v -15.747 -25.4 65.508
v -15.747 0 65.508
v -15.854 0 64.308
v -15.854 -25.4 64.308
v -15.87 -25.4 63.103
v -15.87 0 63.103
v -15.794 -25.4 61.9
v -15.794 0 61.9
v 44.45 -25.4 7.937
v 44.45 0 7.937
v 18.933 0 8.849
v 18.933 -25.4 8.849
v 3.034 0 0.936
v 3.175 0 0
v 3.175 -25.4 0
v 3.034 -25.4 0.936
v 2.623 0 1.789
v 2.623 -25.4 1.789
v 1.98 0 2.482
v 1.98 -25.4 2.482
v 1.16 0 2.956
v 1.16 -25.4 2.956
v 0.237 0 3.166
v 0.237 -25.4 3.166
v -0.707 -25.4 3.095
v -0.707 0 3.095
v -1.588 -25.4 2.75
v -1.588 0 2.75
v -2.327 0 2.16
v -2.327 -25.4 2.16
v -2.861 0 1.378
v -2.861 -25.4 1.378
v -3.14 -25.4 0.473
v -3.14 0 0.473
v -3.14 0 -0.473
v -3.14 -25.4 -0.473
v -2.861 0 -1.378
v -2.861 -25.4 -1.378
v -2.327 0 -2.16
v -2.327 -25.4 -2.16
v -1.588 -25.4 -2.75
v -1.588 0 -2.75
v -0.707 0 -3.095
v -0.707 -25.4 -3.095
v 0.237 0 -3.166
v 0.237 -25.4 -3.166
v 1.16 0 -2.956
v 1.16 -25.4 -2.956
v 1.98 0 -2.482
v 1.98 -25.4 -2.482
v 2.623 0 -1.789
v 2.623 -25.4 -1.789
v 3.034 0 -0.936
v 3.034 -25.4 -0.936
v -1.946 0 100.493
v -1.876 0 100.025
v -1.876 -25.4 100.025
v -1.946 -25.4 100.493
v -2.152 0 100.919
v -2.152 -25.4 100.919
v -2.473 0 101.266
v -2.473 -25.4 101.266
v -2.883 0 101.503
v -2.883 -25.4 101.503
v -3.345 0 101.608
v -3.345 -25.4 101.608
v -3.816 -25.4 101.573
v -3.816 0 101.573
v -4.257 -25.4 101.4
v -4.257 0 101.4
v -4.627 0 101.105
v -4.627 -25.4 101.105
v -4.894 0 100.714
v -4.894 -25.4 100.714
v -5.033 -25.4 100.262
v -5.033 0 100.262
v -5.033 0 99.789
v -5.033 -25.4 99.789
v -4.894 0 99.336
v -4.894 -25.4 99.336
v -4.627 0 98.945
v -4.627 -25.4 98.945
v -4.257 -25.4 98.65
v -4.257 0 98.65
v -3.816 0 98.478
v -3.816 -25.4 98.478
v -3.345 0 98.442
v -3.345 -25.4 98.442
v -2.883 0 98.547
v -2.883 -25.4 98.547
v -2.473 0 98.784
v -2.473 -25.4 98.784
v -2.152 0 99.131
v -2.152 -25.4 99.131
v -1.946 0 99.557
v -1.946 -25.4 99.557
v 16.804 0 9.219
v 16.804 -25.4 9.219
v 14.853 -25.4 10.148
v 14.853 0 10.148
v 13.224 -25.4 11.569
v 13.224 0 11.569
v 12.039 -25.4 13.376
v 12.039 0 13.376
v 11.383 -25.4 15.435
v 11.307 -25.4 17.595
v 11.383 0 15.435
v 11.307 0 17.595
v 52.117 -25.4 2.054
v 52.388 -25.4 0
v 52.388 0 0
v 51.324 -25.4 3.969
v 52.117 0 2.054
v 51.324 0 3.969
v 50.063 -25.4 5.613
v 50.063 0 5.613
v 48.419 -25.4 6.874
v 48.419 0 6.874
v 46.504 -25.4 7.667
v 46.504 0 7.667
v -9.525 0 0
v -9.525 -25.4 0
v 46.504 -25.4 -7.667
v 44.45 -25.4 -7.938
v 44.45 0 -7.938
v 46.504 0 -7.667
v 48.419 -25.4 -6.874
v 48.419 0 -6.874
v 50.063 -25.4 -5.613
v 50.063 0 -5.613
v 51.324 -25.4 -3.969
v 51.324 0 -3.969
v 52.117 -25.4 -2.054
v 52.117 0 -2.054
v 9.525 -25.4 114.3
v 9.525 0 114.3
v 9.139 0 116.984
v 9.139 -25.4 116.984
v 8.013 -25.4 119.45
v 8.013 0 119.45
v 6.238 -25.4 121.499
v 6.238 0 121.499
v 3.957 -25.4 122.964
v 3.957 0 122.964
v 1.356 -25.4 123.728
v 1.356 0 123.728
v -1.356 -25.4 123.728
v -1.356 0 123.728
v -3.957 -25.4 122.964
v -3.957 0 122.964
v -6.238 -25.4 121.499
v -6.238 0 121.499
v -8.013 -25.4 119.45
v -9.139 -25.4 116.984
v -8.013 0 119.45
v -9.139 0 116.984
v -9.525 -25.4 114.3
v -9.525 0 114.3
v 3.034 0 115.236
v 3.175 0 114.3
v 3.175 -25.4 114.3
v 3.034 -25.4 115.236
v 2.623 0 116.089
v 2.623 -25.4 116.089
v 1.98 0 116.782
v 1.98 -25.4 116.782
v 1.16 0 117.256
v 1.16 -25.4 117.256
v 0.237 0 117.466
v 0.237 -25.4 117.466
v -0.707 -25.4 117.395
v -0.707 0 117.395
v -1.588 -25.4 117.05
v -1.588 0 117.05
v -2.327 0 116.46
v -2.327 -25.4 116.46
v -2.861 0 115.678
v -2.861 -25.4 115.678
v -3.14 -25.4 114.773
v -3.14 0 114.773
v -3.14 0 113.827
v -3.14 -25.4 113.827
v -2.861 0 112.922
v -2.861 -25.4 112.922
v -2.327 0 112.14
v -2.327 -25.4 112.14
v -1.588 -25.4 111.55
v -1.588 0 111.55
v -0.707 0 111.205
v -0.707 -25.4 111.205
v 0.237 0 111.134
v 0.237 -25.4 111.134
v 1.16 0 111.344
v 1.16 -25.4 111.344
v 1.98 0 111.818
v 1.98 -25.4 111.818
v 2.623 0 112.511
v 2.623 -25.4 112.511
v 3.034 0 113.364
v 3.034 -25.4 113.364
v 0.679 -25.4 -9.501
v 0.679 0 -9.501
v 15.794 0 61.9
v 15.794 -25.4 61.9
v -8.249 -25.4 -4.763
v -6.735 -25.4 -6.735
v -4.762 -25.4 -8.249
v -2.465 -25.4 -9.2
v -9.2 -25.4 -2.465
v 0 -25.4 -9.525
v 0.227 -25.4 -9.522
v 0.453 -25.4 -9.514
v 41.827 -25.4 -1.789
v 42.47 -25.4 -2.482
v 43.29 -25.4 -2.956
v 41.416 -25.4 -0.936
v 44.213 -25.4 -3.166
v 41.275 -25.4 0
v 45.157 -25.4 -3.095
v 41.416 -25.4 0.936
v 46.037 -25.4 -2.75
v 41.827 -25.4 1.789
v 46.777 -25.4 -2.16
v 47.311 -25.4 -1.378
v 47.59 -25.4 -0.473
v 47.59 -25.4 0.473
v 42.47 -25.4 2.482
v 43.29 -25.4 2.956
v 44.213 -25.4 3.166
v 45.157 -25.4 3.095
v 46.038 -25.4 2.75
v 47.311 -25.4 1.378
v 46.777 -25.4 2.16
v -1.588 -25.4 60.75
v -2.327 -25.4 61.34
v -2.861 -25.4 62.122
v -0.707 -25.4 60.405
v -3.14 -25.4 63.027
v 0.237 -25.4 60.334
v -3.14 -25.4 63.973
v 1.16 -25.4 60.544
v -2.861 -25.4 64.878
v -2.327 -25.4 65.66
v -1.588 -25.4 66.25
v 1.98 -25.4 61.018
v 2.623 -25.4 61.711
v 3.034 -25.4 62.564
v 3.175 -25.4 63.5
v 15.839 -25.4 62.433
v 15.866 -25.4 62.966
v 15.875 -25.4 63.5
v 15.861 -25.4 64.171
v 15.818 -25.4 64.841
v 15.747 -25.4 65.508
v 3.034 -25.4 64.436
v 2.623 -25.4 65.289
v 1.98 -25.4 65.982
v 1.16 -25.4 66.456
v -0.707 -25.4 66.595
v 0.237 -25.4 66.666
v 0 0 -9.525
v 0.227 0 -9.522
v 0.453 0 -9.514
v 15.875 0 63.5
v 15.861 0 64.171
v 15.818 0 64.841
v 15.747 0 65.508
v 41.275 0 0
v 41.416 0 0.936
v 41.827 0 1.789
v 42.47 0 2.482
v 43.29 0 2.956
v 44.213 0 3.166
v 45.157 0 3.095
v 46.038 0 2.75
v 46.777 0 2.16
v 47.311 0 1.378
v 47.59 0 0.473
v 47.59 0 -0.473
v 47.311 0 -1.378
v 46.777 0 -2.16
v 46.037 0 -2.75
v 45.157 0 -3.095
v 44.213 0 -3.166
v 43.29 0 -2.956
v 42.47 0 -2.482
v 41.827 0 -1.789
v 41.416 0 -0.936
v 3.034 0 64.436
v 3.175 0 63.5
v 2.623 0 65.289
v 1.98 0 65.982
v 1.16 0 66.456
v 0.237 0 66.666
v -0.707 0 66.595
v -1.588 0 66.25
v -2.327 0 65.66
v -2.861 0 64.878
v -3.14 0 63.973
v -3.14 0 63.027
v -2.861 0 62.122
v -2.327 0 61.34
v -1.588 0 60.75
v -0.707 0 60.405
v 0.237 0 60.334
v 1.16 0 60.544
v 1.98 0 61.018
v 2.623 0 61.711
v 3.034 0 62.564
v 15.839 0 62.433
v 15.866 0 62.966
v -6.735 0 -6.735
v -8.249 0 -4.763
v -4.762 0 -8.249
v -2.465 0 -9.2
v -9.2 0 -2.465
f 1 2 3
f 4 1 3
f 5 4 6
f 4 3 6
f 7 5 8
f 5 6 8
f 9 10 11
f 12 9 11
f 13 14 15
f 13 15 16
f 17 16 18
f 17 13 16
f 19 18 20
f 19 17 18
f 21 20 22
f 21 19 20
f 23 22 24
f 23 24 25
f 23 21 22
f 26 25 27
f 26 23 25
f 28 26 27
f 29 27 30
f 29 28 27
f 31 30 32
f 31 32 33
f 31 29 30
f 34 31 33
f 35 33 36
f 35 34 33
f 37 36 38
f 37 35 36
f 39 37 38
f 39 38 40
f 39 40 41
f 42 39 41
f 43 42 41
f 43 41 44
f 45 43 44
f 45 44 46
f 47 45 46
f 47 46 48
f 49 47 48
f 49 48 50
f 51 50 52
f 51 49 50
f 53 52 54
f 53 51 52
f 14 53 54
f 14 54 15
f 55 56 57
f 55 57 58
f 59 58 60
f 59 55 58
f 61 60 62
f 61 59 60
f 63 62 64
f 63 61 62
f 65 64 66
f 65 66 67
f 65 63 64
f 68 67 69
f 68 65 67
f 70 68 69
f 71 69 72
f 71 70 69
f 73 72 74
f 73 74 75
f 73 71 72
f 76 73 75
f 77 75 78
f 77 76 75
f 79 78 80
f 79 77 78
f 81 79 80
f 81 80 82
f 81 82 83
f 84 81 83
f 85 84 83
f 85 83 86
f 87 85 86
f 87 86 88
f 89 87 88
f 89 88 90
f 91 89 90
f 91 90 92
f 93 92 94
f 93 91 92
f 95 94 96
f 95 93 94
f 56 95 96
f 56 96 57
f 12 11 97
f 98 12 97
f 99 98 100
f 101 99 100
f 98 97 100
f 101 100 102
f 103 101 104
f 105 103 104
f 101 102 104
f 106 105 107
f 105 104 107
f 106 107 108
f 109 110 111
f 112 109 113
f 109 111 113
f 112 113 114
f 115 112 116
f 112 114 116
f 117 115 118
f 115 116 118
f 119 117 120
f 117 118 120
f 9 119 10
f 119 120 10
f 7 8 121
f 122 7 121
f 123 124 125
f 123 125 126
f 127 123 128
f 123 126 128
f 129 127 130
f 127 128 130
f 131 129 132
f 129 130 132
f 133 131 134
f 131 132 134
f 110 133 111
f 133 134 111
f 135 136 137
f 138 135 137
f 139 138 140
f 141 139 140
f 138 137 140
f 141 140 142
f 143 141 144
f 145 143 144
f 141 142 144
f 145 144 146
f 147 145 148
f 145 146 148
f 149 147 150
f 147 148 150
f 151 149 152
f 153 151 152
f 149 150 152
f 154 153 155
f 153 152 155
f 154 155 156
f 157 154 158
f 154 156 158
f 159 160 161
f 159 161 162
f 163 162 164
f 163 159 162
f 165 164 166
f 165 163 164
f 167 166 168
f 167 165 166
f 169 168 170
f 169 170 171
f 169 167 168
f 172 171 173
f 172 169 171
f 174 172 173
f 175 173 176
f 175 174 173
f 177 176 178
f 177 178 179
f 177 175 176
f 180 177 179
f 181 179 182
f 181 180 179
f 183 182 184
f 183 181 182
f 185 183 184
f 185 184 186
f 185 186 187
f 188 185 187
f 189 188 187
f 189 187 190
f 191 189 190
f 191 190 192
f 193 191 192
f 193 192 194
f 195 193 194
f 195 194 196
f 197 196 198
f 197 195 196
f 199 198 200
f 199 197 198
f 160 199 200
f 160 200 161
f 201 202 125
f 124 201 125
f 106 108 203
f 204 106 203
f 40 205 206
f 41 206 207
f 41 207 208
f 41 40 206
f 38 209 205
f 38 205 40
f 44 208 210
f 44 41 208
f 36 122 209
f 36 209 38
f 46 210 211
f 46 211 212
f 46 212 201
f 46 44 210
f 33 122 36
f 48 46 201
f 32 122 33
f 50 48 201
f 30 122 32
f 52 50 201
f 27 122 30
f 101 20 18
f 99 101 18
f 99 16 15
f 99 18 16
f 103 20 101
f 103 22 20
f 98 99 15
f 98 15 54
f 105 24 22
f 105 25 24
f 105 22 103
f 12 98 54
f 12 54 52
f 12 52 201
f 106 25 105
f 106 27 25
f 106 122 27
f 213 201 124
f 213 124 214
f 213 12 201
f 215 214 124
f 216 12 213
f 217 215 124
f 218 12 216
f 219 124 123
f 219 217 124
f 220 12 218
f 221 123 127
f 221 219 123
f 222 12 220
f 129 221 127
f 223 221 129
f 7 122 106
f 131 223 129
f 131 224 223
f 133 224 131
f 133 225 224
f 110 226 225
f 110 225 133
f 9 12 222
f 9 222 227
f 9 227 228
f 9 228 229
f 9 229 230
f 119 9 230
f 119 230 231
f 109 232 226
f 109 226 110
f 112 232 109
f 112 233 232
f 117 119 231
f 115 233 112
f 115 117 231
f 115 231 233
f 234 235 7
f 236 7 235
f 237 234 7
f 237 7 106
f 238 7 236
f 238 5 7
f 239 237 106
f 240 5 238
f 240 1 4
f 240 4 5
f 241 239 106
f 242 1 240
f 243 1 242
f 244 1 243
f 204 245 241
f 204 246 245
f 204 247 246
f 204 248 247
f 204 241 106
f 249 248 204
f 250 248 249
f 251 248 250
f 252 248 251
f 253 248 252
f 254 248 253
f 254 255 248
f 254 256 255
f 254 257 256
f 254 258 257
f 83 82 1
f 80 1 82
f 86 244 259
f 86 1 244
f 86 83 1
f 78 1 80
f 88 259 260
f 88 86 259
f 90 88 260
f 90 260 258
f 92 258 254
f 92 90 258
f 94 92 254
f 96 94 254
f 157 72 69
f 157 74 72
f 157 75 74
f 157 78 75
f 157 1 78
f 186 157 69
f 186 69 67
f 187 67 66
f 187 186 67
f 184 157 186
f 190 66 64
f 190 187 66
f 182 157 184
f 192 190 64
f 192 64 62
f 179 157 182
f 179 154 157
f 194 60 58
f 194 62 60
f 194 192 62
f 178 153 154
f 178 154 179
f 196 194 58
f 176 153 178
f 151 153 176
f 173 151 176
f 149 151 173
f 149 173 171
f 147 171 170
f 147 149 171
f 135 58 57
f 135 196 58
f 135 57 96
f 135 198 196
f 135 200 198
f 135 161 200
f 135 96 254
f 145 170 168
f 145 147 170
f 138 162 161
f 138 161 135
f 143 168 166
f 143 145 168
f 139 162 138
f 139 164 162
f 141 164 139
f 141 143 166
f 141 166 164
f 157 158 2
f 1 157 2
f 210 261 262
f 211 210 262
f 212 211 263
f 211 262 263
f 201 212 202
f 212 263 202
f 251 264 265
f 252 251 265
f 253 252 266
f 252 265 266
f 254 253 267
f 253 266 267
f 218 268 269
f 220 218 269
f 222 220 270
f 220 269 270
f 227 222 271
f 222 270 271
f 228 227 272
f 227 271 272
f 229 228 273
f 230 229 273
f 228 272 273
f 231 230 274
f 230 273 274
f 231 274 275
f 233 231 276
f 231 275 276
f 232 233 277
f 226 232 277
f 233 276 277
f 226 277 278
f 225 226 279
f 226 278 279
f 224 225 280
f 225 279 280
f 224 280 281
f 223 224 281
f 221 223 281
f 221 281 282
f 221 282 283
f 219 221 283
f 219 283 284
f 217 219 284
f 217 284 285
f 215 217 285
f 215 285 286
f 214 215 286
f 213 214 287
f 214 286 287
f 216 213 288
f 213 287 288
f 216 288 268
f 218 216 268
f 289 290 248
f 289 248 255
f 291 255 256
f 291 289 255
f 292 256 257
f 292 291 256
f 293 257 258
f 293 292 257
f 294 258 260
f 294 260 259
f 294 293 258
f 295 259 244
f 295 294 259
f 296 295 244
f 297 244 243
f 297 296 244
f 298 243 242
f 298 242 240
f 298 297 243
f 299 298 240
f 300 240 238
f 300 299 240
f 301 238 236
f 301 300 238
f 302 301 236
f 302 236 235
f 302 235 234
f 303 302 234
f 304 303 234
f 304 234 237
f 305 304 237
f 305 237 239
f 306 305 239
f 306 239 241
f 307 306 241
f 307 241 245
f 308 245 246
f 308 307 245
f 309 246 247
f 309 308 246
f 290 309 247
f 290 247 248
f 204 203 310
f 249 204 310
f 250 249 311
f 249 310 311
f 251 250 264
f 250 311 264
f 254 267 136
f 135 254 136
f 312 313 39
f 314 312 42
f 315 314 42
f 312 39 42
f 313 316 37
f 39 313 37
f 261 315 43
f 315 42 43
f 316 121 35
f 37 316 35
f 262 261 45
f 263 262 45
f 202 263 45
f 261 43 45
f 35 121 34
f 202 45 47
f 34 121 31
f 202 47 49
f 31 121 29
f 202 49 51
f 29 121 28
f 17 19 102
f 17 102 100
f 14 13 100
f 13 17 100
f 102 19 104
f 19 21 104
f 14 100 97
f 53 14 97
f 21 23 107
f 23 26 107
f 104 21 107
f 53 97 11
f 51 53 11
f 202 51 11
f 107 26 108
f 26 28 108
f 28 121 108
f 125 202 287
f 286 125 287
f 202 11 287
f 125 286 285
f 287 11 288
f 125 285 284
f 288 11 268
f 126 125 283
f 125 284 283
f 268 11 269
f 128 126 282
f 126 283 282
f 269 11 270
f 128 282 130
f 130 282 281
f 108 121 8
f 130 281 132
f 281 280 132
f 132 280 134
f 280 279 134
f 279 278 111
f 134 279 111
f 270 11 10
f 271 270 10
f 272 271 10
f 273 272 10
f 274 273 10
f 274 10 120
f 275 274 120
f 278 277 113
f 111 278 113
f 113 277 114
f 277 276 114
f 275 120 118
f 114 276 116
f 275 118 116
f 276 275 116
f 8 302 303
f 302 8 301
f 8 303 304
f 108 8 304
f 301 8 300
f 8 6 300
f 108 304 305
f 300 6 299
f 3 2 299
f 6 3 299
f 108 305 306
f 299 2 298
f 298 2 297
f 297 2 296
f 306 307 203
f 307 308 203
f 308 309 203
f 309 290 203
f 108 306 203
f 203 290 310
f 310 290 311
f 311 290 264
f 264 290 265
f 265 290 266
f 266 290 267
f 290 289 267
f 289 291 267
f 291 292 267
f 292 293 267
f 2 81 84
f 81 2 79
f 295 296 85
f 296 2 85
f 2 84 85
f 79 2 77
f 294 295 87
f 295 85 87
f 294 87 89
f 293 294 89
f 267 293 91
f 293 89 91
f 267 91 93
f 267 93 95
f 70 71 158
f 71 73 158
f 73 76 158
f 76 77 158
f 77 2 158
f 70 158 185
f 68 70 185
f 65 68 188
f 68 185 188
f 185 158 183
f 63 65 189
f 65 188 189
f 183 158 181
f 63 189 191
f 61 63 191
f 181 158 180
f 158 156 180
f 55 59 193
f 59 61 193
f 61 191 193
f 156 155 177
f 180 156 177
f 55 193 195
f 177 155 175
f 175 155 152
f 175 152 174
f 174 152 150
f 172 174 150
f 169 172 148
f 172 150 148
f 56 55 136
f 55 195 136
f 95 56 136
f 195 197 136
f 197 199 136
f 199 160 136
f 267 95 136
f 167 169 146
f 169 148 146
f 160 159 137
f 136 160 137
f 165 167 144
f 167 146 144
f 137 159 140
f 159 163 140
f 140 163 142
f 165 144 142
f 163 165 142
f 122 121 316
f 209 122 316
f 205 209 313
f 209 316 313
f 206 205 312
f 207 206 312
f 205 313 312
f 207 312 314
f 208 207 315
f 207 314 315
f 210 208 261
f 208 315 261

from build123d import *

# Parameters (mm, degrees)
F0_R     = 3.175
F0_R_2   = 1.5875
F1_DEPTH = 25.4


with BuildPart() as f1:
    # F0 (on Front) → F1 (new body)
    with BuildSketch(Plane.XZ):
        with BuildLine():
            ThreePointArc((0.6794904459, -9.5007324841), (6.9712901065, -6.4905114784), (9.525, 0))
            ThreePointArc((9.525, 0), (0, 9.525), (-9.525, 0))
            ThreePointArc((-9.525, 0), (-6.7351920908, -6.7351920908), (0, -9.525))
            Line((0, -9.525), (0.6794904459, -9.5007324841))
        make_face()
        Circle(F0_R, mode=Mode.SUBTRACT)
        with BuildLine():
            Line((36.5125, 0), (9.525, 0))
            ThreePointArc((9.525, 0), (6.9712901065, -6.4905114784), (0.6794904459, -9.5007324841))
            Line((0.6794904459, -9.5007324841), (44.45, -7.9375))
            ThreePointArc((44.45, -7.9375), (38.8373399243, -5.6126600757), (36.5125, 0))
        make_face()
        with BuildLine():
            ThreePointArc((-9.525, 0), (0, 9.525), (9.525, 0))
            Line((9.525, 0), (36.5125, 0))
            ThreePointArc((36.5125, 0), (38.8373399243, 5.6126600757), (44.45, 7.9375))
            Line((44.45, 7.9375), (18.9329889534, 8.8488218231))
            ThreePointArc((18.9329889534, 8.8488218231), (13.22446249, 11.5691841219), (11.3070069952, 17.5950458731))
            Line((11.3070069952, 17.5950458731), (15.7942028036, 61.9003804205))
            ThreePointArc((15.7942028036, 61.9003804205), (0, 47.625), (-15.7942028036, 61.9003804205))
            Line((-15.7942028036, 61.9003804205), (-9.525, 0))
        make_face()
        with BuildLine():
            ThreePointArc((0, -9.525), (0.3399618281, -9.5189311877), (0.6794904459, -9.5007324841))
            Line((0.6794904459, -9.5007324841), (0, -9.525))
        make_face()
        with BuildLine():
            ThreePointArc((44.45, 7.9375), (38.8373399243, 5.6126600757), (36.5125, 0))
            ThreePointArc((36.5125, 0), (38.8373399243, -5.6126600757), (44.45, -7.9375))
            ThreePointArc((44.45, -7.9375), (50.0626600757, -5.6126600757), (52.3875, 0))
            ThreePointArc((52.3875, 0), (50.0626600757, 5.6126600757), (44.45, 7.9375))
        make_face()
        with BuildLine():
            ThreePointArc((47.625, 0), (44.45, -3.175), (41.275, 0))
            ThreePointArc((41.275, 0), (44.45, 3.175), (47.625, 0))
        make_face(mode=Mode.SUBTRACT)
        with BuildLine():
            ThreePointArc((-15.7474569047, 65.5082893304), (-15.873667691, 63.7056672947), (-15.7942028036, 61.9003804205))
            ThreePointArc((-15.7942028036, 61.9003804205), (0, 47.625), (15.7942028036, 61.9003804205))
            ThreePointArc((15.7942028036, 61.9003804205), (15.8547878338, 62.6991705884), (15.875, 63.5))
            ThreePointArc((15.875, 63.5), (15.8430821396, 64.5061676396), (15.7474569047, 65.5082893304))
            ThreePointArc((15.7474569047, 65.5082893304), (0, 79.375), (-15.7474569047, 65.5082893304))
        make_face()
        with Locations((0, 63.5)):
            Circle(F0_R, mode=Mode.SUBTRACT)
        with BuildLine():
            Line((-9.525, 114.3), (-15.7474569047, 65.5082893304))
            ThreePointArc((-15.7474569047, 65.5082893304), (0, 79.375), (15.7474569047, 65.5082893304))
            Line((15.7474569047, 65.5082893304), (9.525, 114.3))
            ThreePointArc((9.525, 114.3), (0, 104.775), (-9.525, 114.3))
        make_face()
        with Locations((-3.4632231109, 100.0252)):
            Circle(F0_R_2, mode=Mode.SUBTRACT)
        with BuildLine():
            ThreePointArc((9.525, 114.3), (0, 123.825), (-9.525, 114.3))
            ThreePointArc((-9.525, 114.3), (0, 104.775), (9.525, 114.3))
        make_face()
        with Locations((0, 114.3)):
            Circle(F0_R, mode=Mode.SUBTRACT)
    extrude(amount=F1_DEPTH)


solid = f1.part
